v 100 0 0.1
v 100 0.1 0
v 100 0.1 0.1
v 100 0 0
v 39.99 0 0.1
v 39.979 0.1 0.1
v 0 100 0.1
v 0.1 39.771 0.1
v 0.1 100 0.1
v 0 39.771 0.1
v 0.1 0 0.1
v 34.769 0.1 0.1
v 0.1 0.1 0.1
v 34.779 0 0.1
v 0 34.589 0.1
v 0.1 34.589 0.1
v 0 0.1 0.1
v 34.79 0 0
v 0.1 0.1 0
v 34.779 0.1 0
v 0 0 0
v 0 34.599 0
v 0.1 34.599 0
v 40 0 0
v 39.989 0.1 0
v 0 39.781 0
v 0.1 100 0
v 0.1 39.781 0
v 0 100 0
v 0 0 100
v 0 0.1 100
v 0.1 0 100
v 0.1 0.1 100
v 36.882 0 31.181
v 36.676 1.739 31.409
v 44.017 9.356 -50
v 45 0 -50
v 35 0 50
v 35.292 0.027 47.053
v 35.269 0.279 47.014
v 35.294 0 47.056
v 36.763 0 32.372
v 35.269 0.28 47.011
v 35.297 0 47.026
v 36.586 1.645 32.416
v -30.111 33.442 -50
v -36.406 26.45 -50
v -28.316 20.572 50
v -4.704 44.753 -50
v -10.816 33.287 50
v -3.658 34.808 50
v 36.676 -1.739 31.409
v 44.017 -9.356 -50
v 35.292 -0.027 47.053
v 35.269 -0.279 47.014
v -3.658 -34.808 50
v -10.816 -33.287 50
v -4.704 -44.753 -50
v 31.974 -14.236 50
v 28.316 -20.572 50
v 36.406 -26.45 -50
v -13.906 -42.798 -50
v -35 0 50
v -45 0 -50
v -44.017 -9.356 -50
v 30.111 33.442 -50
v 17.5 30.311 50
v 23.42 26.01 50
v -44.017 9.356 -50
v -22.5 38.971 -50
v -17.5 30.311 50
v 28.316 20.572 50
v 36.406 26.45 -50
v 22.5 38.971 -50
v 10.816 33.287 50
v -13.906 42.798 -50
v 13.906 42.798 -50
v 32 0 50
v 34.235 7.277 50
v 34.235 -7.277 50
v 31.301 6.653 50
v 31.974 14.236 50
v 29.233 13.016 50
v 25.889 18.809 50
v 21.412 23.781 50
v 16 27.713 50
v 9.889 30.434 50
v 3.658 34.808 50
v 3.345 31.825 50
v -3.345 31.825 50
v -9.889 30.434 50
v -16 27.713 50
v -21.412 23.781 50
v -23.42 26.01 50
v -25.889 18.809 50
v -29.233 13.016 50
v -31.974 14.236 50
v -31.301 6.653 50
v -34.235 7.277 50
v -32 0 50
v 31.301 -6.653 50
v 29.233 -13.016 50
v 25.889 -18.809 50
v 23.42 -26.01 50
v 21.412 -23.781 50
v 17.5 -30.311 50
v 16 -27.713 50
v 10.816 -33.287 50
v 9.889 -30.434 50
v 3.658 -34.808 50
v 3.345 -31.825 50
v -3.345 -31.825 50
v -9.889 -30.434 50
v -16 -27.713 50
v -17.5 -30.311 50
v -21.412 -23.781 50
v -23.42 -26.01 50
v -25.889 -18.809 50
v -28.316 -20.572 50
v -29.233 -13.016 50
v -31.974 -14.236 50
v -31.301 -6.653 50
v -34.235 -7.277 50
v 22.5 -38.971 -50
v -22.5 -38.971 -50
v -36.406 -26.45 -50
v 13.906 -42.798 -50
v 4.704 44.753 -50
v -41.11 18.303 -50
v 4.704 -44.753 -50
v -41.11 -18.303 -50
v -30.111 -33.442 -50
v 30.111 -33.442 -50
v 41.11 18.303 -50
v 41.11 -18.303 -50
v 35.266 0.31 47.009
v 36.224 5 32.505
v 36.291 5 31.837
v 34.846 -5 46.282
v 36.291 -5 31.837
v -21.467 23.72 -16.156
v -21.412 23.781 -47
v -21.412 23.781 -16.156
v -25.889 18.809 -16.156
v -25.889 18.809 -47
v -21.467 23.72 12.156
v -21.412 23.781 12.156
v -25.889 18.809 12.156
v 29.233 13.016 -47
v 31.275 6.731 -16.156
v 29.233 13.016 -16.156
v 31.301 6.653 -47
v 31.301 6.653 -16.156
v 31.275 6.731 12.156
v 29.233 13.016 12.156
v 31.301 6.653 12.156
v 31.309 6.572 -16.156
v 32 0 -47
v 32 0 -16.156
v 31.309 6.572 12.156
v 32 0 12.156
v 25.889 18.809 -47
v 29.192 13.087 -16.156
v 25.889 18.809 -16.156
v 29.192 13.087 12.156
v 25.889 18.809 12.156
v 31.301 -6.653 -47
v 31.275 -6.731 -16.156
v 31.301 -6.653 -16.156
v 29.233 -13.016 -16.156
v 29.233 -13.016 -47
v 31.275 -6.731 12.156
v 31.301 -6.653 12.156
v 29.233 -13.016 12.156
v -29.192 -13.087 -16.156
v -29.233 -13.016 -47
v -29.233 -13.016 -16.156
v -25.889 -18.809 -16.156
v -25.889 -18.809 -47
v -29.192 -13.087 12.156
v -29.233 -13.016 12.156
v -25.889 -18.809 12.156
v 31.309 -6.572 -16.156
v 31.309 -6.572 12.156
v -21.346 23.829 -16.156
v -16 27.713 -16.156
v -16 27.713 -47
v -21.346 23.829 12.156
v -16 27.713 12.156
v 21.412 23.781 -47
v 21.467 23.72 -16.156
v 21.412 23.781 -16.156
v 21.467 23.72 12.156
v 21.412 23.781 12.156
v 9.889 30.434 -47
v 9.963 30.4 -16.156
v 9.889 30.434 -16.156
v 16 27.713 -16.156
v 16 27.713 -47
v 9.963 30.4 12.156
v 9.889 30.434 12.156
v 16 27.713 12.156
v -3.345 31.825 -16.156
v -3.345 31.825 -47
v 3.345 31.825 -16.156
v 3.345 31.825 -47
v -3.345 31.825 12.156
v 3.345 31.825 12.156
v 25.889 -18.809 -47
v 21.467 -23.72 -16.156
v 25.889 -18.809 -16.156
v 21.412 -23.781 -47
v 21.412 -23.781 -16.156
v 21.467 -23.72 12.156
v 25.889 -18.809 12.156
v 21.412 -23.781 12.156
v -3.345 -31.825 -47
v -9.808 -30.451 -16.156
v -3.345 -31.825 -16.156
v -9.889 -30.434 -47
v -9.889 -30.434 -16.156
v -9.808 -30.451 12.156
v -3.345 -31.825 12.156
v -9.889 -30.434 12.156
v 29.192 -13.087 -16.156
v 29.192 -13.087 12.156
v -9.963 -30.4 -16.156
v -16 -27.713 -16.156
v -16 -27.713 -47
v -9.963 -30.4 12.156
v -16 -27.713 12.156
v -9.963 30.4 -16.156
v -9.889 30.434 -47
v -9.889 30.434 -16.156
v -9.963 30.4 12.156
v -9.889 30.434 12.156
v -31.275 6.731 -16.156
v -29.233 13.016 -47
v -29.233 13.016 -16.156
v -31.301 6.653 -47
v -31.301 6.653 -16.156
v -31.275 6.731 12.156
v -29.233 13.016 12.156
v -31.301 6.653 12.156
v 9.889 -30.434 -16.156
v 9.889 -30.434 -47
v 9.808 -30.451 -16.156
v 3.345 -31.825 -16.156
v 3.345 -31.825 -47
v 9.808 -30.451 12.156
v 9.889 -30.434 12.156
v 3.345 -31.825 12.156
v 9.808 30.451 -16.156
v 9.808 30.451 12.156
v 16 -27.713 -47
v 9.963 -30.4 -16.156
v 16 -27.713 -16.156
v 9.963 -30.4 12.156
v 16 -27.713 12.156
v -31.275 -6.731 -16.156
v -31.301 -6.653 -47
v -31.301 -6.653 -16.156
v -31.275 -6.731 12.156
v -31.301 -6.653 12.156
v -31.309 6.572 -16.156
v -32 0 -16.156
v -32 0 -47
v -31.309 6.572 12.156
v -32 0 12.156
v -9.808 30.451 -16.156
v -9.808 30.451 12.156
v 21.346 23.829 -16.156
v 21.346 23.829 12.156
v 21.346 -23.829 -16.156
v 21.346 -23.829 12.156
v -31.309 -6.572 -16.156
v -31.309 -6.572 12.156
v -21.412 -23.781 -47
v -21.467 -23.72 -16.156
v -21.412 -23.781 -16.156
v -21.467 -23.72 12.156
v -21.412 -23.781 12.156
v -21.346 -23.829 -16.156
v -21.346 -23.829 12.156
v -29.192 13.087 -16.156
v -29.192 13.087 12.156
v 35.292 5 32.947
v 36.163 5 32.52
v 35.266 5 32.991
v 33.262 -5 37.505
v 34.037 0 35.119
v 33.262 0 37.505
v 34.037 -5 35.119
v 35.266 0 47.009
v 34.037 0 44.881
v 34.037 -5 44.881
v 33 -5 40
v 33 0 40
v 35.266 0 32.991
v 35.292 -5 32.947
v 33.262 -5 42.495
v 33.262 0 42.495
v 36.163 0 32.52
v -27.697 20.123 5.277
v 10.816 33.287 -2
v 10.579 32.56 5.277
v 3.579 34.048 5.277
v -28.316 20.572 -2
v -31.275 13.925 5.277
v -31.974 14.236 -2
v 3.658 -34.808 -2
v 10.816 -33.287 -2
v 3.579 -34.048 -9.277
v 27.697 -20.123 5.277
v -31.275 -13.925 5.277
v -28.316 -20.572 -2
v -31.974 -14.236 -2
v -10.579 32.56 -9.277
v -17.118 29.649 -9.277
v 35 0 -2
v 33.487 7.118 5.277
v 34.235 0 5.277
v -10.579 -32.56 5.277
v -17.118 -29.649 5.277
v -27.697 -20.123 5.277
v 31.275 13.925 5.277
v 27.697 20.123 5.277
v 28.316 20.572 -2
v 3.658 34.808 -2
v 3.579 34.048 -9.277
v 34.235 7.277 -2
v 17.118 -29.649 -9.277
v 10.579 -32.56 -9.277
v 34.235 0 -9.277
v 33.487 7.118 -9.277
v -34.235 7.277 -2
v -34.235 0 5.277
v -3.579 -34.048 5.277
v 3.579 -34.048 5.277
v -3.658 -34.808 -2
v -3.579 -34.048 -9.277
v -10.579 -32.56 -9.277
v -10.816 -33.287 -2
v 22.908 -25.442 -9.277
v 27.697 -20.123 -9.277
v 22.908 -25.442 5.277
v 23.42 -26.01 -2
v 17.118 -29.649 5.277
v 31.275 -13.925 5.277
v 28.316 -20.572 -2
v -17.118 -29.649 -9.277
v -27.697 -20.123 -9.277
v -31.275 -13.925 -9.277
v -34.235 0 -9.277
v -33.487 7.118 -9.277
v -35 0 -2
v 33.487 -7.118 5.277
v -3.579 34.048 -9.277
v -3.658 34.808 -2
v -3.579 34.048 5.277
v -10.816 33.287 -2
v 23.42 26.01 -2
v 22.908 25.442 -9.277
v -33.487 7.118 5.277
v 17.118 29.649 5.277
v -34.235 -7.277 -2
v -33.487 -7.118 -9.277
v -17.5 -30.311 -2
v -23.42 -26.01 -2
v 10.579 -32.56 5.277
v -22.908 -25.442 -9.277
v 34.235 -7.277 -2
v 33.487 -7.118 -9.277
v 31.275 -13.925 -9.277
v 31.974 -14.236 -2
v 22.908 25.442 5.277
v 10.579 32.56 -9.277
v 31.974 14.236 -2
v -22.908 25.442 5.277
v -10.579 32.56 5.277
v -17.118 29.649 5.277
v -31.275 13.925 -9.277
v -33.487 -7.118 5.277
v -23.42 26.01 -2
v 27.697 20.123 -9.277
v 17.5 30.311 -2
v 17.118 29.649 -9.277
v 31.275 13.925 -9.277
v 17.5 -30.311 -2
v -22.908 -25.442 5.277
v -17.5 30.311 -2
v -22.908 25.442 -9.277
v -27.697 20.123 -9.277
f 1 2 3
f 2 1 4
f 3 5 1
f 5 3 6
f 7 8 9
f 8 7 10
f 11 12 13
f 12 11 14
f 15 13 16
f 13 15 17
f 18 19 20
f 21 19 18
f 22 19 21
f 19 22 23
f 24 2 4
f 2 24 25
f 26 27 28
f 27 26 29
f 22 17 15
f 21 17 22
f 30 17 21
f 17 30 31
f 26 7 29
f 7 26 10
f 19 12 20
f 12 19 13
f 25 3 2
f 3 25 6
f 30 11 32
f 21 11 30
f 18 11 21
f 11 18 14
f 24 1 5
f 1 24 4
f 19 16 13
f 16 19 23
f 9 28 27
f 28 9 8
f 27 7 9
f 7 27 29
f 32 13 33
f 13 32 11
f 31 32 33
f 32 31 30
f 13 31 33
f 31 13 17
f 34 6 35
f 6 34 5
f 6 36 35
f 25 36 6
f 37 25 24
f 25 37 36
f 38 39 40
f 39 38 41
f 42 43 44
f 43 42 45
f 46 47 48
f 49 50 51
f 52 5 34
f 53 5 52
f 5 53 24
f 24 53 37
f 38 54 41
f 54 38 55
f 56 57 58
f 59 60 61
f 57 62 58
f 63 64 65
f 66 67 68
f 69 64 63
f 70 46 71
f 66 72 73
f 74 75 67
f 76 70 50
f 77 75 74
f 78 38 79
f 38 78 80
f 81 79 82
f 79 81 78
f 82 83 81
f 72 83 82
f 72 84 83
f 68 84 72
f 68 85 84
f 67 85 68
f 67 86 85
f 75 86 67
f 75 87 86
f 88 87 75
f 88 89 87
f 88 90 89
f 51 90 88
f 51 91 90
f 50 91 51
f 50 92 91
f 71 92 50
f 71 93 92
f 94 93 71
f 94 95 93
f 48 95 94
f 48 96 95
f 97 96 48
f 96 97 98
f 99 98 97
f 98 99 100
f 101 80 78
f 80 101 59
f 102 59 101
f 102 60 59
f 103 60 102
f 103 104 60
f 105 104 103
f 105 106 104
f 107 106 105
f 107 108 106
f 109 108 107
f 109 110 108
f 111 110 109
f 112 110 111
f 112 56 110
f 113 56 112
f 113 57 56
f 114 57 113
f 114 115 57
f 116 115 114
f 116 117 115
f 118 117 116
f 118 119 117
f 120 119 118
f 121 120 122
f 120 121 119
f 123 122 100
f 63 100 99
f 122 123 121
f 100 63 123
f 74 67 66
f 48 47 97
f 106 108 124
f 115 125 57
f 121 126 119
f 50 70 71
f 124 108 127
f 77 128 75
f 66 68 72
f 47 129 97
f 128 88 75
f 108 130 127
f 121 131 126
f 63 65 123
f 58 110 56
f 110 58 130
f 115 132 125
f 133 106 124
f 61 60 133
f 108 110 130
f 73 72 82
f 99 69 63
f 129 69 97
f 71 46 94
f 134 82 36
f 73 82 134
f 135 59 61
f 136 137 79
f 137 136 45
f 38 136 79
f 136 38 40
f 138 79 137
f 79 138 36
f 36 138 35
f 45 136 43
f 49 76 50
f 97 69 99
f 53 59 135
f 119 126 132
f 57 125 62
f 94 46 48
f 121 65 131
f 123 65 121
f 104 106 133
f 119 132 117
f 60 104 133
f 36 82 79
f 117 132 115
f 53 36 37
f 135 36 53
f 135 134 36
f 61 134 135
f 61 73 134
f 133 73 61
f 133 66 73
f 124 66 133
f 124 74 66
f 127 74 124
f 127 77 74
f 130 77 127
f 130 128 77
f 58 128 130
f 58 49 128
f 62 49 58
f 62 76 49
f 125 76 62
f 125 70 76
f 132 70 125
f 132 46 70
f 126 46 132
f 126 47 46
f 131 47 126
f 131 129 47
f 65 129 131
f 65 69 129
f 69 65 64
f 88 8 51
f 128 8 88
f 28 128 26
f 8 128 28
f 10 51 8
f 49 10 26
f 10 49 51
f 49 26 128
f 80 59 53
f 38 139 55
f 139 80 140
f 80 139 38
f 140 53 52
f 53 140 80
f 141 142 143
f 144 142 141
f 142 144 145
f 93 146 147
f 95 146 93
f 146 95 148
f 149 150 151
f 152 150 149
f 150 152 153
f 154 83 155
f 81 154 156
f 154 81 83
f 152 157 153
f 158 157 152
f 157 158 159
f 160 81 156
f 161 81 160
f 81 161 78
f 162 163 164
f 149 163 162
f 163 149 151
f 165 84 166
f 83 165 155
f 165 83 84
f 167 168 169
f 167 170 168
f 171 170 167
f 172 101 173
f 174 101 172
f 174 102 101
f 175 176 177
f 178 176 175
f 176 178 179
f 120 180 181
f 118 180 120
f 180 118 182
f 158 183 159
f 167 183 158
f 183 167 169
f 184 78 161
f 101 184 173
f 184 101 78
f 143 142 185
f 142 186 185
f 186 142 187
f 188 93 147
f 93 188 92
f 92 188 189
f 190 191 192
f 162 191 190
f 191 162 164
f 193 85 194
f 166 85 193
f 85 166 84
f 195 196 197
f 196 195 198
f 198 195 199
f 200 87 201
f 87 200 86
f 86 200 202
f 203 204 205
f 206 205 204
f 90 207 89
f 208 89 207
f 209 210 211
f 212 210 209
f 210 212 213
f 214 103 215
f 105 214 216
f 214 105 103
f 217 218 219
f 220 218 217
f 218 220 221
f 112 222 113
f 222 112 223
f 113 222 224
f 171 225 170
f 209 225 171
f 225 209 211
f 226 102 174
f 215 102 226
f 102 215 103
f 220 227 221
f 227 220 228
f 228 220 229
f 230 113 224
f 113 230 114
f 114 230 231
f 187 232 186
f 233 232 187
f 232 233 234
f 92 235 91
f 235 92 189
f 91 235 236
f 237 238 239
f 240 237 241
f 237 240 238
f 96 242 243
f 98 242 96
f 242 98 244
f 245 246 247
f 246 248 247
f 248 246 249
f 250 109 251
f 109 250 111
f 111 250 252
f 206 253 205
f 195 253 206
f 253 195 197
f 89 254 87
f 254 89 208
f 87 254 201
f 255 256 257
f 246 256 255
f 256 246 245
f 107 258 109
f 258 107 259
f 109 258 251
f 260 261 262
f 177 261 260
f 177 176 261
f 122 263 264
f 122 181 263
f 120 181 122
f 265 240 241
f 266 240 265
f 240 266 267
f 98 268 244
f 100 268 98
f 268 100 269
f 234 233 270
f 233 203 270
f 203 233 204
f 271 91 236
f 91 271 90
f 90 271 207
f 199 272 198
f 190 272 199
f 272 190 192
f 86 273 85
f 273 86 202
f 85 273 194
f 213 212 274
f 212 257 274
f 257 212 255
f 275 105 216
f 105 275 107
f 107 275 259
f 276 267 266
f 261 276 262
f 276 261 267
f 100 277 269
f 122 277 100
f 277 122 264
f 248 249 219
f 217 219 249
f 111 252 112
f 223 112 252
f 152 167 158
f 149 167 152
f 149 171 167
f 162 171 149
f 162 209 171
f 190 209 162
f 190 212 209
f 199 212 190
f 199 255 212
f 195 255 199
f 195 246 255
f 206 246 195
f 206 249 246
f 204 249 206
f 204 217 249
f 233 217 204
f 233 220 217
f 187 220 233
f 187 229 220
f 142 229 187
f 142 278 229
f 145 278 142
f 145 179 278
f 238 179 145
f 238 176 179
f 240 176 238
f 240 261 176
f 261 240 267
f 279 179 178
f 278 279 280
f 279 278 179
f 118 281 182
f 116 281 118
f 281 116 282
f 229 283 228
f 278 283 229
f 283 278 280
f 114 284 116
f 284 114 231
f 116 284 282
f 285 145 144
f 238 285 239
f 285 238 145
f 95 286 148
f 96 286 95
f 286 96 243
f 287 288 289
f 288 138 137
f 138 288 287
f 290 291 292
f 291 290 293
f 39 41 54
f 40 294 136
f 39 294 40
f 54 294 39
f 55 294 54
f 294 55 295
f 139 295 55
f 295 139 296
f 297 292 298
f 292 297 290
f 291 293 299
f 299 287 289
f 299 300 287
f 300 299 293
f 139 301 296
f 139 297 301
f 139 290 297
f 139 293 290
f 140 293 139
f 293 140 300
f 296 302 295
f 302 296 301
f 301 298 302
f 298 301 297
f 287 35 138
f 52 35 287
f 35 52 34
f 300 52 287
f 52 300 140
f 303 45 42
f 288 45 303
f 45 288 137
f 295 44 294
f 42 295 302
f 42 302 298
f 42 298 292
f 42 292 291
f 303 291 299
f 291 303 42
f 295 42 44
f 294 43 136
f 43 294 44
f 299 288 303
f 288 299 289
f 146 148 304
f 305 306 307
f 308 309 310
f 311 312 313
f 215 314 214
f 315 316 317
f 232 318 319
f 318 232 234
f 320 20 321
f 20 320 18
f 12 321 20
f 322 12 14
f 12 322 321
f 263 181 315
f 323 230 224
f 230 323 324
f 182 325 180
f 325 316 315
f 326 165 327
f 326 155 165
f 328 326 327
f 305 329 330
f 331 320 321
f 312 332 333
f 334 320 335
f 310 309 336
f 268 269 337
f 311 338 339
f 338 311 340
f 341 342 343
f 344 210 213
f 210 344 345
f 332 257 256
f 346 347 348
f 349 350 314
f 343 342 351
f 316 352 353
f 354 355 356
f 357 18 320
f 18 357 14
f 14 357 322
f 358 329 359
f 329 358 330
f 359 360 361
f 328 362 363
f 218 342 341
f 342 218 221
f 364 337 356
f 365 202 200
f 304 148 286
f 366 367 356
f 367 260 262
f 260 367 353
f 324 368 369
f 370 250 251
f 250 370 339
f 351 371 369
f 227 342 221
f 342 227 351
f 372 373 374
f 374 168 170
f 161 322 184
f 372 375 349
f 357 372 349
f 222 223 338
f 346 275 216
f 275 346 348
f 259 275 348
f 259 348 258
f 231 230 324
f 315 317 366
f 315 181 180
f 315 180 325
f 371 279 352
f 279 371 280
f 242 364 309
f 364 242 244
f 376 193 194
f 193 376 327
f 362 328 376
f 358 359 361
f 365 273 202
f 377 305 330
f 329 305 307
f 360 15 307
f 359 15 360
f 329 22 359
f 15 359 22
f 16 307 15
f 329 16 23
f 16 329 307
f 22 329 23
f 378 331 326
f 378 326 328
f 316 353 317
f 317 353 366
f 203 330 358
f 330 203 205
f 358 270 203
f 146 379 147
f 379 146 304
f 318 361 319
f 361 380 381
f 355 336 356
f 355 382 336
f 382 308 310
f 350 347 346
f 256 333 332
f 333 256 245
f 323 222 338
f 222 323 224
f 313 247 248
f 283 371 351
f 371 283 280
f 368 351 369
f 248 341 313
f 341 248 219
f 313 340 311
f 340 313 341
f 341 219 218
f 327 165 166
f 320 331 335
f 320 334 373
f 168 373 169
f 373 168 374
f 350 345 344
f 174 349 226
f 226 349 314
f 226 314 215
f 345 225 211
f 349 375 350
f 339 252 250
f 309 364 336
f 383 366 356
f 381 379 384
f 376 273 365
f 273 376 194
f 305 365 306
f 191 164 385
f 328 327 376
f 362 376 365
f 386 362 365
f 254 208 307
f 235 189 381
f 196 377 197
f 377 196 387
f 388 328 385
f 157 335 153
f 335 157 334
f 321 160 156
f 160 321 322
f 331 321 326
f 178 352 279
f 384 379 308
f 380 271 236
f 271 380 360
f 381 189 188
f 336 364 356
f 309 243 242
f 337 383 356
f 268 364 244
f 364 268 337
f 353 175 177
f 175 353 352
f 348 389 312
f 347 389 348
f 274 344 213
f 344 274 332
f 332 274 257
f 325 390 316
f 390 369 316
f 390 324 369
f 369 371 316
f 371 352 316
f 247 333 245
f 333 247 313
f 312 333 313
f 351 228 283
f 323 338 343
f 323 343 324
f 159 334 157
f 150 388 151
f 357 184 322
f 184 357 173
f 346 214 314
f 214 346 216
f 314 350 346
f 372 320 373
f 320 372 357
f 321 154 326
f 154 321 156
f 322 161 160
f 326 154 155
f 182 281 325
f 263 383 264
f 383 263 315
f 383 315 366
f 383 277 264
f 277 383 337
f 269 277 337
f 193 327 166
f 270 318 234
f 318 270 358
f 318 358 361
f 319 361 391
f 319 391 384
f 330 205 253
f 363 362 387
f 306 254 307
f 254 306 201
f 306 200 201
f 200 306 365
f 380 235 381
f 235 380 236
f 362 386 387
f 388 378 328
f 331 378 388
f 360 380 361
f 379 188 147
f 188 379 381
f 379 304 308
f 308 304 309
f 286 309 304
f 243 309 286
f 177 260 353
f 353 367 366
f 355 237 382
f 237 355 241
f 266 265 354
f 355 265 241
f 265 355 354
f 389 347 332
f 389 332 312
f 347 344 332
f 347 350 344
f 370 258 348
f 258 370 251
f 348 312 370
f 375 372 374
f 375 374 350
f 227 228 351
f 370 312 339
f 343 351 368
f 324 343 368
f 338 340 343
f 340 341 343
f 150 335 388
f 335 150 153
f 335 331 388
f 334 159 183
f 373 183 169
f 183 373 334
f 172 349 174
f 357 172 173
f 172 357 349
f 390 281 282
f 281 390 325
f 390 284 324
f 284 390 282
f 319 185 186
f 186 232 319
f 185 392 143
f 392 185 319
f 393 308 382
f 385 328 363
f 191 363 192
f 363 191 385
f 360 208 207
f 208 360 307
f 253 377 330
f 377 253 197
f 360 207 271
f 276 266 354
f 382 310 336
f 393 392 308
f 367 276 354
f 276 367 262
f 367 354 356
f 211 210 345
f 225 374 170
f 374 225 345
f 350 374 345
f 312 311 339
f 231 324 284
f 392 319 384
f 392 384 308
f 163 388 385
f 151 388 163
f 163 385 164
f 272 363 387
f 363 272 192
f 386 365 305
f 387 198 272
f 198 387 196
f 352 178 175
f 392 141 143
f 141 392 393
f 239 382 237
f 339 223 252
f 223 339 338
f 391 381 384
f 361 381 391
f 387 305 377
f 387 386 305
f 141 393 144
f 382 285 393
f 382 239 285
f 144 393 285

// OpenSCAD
    // Combined Scene

    // Permanent Model
    
    // Permanent Model (Black)
    color([0, 0, 0]) {
        // Your permanent model code here
        cube([100,0.1,0.1], center = false);
        cube([0.1,100,0.1], center = false);
        cube([0.1,0.1,100], center = false);
    }
    

    // Dynamic Model
    difference() {
    // Main mug body
    difference() {
        // Outer shape with a wider top and narrower bottom
        cylinder(h=100, r1=45, r2=35, center=true); // Slightly wider at the top
        // Inner hollow space for fluid containment with 3 mm wall thickness
        translate([0, 0, 2])
            cylinder(h=98, r=32, center=true); // 3 mm wall thickness
    }

    // Handle of the mug
    translate([45, 0, 40])
        rotate([90, 0, 0])
            difference() {
                // Outer part of handle
                scale([1, 1, 0.5])
                    cylinder(h=20, r=12, center=true); // Slightly larger handle
                // Inner cutout of handle
                translate([-6, 0, -10])
                    scale([1, 1, 0.5])
                        cylinder(h=40, r=8, center=true); // Maintain wall thickness
            }

    // Rounded base for stability
    translate([0, 0, -2])
        sphere(r=35); // Use sphere to create a rounded base

    // Flared rim for comfort
    translate([0, 0, 100])
        cylinder(h=5, r1=47, r2=35, center=true); // Flare the rim
    
    // Texturing for grip
    for (i = [0:8]) {
        // Create vertical grooves for grip
        rotate(i * 45)
            translate([25, 0, 0])
                linear_extrude(height=100)
                    offset(r=0.5)
                        polygon(points=[[0, -3], [0, 3], [1, 3], [1, -3]]);
    }
}
    
